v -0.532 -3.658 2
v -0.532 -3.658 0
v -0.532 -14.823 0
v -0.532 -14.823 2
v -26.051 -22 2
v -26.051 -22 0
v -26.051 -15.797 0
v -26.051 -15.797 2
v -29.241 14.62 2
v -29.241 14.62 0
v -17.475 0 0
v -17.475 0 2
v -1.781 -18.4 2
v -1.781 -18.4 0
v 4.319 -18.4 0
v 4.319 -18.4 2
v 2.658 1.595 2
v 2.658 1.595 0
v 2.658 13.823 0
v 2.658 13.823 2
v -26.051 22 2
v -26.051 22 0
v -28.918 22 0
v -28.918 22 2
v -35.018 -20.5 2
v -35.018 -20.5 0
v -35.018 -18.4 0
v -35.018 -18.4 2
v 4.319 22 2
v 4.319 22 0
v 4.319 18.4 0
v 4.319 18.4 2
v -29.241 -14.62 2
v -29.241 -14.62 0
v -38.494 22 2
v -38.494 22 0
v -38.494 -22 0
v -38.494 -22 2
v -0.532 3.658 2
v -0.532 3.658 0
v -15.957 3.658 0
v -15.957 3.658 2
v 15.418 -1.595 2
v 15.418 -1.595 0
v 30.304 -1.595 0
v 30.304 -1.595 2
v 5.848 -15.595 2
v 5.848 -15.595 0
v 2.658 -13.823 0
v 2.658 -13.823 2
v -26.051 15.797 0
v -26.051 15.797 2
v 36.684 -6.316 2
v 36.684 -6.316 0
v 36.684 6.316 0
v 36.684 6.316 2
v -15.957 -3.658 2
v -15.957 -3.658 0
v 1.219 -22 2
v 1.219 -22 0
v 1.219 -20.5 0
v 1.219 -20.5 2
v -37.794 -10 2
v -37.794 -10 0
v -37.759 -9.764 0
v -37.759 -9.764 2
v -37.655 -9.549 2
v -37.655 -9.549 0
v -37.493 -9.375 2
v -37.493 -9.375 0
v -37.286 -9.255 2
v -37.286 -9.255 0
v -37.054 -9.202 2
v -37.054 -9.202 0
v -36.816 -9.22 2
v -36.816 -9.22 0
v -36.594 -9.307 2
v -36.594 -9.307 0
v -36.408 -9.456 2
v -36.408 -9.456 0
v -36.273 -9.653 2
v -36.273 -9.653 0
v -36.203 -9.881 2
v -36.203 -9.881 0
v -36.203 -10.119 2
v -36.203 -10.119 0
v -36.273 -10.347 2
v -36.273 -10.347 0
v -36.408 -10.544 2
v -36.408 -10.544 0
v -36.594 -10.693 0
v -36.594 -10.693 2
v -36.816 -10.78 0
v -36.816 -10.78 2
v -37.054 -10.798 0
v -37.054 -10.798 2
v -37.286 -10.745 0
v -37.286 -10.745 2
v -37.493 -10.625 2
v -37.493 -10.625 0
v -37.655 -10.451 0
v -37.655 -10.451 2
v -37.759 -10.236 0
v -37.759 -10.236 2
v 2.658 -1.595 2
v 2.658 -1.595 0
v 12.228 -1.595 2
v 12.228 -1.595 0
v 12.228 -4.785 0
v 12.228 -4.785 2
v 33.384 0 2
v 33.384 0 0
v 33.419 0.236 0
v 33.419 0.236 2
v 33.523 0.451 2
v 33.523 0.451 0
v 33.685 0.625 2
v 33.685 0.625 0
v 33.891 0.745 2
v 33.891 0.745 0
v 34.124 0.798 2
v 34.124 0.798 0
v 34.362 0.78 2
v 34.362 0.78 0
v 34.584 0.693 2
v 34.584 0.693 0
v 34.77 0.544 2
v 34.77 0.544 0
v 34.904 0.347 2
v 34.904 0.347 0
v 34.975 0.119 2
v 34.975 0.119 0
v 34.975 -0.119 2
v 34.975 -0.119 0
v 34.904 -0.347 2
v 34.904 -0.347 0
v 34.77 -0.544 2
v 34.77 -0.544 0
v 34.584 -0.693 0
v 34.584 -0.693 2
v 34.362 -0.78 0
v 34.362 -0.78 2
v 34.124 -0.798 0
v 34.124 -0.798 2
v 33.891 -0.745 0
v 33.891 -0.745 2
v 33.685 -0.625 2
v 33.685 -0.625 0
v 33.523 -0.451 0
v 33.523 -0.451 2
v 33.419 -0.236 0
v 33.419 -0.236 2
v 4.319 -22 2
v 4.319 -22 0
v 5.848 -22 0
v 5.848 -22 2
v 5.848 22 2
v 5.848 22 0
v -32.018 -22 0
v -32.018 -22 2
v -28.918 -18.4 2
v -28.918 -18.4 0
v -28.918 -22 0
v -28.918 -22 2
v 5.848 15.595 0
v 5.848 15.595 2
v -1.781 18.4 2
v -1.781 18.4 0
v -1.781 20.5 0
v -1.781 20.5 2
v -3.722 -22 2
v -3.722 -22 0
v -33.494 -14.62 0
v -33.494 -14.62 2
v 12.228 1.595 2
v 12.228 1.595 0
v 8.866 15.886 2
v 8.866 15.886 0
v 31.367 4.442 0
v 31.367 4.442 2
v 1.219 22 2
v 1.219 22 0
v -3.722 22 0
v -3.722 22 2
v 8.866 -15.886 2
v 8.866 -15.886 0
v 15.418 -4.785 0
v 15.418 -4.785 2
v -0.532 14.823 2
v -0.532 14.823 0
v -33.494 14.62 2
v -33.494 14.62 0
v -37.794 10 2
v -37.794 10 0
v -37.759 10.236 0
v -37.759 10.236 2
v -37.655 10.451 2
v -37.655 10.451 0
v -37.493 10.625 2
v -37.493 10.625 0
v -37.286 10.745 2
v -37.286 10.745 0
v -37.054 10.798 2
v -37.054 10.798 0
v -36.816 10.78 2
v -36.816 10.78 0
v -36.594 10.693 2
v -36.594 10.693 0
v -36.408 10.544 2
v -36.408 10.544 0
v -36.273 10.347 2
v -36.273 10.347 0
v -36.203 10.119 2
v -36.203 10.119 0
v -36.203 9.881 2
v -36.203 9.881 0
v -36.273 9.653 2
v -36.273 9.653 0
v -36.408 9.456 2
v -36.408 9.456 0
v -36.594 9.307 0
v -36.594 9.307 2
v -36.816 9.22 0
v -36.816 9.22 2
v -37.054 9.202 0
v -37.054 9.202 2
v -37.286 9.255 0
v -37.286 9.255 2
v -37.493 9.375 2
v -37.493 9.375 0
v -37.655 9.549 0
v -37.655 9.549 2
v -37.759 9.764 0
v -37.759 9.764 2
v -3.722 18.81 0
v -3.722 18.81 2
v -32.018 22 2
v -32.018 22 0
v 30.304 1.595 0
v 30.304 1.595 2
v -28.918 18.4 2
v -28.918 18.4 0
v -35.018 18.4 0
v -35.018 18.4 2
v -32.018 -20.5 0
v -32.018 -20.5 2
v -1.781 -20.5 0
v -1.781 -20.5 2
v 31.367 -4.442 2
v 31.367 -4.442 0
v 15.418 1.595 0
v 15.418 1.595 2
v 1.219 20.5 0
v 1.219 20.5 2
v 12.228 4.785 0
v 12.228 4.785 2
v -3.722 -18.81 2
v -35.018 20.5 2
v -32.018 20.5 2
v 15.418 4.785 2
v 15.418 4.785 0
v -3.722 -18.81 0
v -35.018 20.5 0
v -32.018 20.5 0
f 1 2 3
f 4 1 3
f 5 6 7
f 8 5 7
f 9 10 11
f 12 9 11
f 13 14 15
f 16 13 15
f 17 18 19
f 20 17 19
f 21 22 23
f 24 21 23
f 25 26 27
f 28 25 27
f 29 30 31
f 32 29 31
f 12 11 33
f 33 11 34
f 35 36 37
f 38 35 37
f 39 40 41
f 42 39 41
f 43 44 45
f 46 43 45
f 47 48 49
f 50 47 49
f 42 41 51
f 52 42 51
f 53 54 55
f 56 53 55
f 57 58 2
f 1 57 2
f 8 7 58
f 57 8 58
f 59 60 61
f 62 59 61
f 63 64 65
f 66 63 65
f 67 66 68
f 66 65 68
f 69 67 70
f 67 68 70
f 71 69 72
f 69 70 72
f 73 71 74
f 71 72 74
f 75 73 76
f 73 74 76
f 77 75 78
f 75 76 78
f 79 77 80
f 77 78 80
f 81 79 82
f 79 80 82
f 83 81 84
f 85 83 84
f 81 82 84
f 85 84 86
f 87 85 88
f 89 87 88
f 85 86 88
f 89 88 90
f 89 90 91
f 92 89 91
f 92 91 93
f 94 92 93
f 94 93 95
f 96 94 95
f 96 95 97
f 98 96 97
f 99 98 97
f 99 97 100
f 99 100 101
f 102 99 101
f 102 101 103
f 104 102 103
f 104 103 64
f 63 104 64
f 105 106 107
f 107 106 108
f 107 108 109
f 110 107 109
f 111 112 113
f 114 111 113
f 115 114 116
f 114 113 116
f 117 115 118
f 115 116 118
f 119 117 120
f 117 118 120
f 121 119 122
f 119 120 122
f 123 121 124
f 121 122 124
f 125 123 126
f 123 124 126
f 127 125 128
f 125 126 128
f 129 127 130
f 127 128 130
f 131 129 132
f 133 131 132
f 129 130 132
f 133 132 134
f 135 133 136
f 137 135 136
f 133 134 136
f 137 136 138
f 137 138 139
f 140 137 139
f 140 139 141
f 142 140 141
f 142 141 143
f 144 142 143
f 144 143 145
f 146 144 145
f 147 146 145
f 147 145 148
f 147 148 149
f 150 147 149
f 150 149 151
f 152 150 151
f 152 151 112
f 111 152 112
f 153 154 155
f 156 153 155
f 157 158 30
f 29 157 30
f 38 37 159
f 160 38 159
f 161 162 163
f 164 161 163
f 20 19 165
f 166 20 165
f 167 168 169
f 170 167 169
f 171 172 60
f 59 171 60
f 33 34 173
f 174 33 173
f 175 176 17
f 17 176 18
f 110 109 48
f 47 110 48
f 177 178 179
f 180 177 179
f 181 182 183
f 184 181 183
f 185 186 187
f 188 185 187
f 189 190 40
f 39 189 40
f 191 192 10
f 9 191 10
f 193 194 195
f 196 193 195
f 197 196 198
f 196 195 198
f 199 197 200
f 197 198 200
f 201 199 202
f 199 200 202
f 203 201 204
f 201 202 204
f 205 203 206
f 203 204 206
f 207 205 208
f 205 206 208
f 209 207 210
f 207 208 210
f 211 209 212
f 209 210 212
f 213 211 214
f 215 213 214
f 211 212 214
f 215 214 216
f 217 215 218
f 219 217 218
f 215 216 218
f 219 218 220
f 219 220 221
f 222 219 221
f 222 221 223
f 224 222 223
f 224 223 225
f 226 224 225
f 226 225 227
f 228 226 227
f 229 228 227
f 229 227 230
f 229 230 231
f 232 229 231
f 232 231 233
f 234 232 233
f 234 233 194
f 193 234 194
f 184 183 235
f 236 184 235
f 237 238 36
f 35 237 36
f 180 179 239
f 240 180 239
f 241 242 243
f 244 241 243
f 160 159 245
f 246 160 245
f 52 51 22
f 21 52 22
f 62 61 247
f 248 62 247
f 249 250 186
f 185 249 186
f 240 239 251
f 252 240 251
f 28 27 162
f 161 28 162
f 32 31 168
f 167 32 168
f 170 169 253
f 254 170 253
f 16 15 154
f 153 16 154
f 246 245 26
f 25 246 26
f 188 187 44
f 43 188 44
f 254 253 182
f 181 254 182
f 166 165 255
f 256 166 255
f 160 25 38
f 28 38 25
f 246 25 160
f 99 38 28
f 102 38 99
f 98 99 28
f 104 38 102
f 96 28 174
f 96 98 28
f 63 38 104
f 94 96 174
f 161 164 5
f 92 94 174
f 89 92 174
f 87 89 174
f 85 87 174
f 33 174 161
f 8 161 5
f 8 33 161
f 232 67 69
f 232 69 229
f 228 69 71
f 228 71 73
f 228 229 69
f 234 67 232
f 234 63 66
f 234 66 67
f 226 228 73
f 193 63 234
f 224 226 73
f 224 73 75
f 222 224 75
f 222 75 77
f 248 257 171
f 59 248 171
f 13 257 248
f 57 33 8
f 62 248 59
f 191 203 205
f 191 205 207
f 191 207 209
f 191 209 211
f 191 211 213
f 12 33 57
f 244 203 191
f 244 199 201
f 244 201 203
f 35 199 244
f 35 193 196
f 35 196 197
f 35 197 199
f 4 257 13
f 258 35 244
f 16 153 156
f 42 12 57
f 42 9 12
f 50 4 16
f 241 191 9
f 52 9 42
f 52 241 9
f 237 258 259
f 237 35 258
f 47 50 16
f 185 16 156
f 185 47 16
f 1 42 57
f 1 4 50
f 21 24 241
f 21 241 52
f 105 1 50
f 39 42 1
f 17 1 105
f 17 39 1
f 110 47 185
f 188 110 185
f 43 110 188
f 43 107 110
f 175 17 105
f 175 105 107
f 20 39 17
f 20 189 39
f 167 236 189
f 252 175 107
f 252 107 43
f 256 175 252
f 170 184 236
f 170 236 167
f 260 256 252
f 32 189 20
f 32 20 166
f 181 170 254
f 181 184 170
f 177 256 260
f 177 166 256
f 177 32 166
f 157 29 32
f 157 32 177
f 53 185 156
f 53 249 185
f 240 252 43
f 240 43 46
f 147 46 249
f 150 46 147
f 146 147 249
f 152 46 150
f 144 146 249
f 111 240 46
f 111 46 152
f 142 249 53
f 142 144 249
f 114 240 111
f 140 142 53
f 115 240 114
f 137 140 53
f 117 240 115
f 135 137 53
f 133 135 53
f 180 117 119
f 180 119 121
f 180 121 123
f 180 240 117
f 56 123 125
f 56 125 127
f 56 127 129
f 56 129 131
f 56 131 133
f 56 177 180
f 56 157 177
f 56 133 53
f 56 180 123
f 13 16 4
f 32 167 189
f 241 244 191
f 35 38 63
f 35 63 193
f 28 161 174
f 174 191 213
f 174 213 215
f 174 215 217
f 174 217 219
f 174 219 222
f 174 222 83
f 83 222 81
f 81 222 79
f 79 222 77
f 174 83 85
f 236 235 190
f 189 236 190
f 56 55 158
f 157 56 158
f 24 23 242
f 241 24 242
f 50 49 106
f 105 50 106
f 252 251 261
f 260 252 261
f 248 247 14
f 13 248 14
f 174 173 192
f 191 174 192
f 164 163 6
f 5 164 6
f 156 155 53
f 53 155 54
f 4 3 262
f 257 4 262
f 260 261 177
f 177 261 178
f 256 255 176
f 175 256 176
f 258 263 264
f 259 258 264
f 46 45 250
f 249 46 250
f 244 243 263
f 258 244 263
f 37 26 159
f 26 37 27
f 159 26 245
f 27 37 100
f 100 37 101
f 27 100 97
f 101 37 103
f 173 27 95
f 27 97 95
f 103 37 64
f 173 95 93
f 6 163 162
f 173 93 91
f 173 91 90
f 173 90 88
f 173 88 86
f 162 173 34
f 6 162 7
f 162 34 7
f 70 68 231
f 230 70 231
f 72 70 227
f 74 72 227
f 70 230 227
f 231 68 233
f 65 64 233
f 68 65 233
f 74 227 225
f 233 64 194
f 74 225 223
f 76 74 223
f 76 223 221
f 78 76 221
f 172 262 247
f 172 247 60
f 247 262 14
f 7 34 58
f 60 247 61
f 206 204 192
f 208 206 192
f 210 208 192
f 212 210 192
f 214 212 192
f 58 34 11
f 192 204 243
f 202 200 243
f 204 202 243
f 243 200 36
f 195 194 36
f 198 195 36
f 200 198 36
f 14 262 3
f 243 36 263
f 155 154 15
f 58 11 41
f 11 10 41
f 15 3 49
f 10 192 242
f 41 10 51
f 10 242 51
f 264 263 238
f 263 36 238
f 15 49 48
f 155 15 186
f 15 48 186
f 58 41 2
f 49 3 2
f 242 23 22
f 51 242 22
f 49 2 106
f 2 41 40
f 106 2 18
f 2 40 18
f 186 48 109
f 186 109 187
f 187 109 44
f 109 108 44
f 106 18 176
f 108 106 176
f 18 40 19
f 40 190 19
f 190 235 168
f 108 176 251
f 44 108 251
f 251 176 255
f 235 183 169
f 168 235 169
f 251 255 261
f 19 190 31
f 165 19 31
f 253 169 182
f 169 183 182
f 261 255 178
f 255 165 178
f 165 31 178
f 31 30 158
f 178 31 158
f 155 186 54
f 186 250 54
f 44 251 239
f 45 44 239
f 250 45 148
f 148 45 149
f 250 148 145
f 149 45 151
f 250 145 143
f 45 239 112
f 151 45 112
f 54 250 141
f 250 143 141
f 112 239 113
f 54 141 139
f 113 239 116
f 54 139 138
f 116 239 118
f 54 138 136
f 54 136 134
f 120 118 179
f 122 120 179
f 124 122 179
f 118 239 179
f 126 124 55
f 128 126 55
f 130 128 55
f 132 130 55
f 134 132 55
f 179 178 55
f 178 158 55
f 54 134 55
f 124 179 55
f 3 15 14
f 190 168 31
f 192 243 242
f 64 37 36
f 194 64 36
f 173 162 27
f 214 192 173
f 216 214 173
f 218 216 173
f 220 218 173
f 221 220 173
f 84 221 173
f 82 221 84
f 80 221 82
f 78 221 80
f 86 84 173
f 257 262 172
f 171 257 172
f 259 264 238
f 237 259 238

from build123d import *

# Parameters (mm, degrees)
EXTRUDE_2_DEPTH        = 2
HOLE_WIZARD_M2_1_D     = 1.6
HOLE_WIZARD_M2_1_DEPTH = 5.2
HOLE_WIZARD_M2_1_TIP   = 0.480688495


with BuildPart() as part:
    # 草图2 → 凸台-拉伸2 (new body)
    with BuildSketch(Plane.XY):
        Polygon((-26.050632556, -22), (-26.050632556, -15.796671569), (-15.95719104, -3.658227581), (-0.531644656, -3.658227581), (-0.531644656, -14.822784766), (-3.721518143, -18.810126501), (-3.721518143, -22), (1.218768965, -22), (1.218768965, -20.5), (-1.781231035, -20.5), (-1.781231035, -18.4), (4.318768965, -18.4), (4.318768965, -22), (5.848102303, -22), (36.683545842, -6.316455894), (36.683545842, 0), (36.683545842, 6.316455398), (5.848102306, 22), (4.318768965, 22), (4.318768965, 18.4), (-1.781231035, 18.4), (-1.781231035, 20.5), (1.218768965, 20.5), (1.218768965, 22), (-3.721518139, 22), (-3.721518139, 18.810127986), (-0.531644652, 14.822786003), (-0.531644652, 3.65822808), (-15.95719104, 3.65822808), (-26.050632552, 15.796672063), (-26.050632552, 22), (-28.918052143, 22), (-28.918052143, 18.4), (-35.018052143, 18.4), (-35.018052143, 20.5), (-32.018052143, 20.5), (-32.018052143, 22), (-38.494101839, 22), (-38.494101839, -22), (-32.018052143, -22), (-32.018052143, -20.5), (-35.018052143, -20.5), (-35.018052143, -18.4), (-28.918052143, -18.4), (-28.918052143, -22), align=None)
        Polygon((31.367089202, 4.441746568), (30.303797872, 1.594936736), (15.417722268, 1.594936736), (15.417722268, 4.784810719), (8.86606295, 15.886233204), align=None, mode=Mode.SUBTRACT)
        Polygon((30.303797878, -1.594936257), (31.367089202, -4.441745082), (8.86606295, -15.886233452), (15.417722268, -4.784810223), (15.417722268, -1.594936257), align=None, mode=Mode.SUBTRACT)
        Polygon((5.8481023, -15.594936496), (2.658228824, -13.822784785), (2.658228824, -1.594936252), (12.227849285, -1.594936252), (12.227849285, -4.784810209), align=None, mode=Mode.SUBTRACT)
        Polygon((12.22784928, 1.594936739), (2.658228819, 1.594936739), (2.658228819, 13.822786023), (5.848102294, 15.594936248), (12.22784928, 4.784810704), align=None, mode=Mode.SUBTRACT)
        Polygon((-17.475034956, -1.79e-07), (-29.240506549, -14.620253036), (-33.493669867, -14.620253036), (-33.493669867, 14.620254005), (-29.240506547, 14.620254005), align=None, mode=Mode.SUBTRACT)
    extrude(amount=EXTRUDE_2_DEPTH)

    # M2 螺纹孔1
    with Locations(Plane.XY.offset(2)):
        with Locations((-36.994101839, 10), (-36.994101839, -10), (34.183545842, 0)):
            Hole(HOLE_WIZARD_M2_1_D / 2, depth=HOLE_WIZARD_M2_1_DEPTH)
            with Locations((0, 0, -(HOLE_WIZARD_M2_1_DEPTH + HOLE_WIZARD_M2_1_TIP / 2))):  # 118° drill point
                Cone(0, HOLE_WIZARD_M2_1_D / 2, HOLE_WIZARD_M2_1_TIP, mode=Mode.SUBTRACT)


solid = part.part
